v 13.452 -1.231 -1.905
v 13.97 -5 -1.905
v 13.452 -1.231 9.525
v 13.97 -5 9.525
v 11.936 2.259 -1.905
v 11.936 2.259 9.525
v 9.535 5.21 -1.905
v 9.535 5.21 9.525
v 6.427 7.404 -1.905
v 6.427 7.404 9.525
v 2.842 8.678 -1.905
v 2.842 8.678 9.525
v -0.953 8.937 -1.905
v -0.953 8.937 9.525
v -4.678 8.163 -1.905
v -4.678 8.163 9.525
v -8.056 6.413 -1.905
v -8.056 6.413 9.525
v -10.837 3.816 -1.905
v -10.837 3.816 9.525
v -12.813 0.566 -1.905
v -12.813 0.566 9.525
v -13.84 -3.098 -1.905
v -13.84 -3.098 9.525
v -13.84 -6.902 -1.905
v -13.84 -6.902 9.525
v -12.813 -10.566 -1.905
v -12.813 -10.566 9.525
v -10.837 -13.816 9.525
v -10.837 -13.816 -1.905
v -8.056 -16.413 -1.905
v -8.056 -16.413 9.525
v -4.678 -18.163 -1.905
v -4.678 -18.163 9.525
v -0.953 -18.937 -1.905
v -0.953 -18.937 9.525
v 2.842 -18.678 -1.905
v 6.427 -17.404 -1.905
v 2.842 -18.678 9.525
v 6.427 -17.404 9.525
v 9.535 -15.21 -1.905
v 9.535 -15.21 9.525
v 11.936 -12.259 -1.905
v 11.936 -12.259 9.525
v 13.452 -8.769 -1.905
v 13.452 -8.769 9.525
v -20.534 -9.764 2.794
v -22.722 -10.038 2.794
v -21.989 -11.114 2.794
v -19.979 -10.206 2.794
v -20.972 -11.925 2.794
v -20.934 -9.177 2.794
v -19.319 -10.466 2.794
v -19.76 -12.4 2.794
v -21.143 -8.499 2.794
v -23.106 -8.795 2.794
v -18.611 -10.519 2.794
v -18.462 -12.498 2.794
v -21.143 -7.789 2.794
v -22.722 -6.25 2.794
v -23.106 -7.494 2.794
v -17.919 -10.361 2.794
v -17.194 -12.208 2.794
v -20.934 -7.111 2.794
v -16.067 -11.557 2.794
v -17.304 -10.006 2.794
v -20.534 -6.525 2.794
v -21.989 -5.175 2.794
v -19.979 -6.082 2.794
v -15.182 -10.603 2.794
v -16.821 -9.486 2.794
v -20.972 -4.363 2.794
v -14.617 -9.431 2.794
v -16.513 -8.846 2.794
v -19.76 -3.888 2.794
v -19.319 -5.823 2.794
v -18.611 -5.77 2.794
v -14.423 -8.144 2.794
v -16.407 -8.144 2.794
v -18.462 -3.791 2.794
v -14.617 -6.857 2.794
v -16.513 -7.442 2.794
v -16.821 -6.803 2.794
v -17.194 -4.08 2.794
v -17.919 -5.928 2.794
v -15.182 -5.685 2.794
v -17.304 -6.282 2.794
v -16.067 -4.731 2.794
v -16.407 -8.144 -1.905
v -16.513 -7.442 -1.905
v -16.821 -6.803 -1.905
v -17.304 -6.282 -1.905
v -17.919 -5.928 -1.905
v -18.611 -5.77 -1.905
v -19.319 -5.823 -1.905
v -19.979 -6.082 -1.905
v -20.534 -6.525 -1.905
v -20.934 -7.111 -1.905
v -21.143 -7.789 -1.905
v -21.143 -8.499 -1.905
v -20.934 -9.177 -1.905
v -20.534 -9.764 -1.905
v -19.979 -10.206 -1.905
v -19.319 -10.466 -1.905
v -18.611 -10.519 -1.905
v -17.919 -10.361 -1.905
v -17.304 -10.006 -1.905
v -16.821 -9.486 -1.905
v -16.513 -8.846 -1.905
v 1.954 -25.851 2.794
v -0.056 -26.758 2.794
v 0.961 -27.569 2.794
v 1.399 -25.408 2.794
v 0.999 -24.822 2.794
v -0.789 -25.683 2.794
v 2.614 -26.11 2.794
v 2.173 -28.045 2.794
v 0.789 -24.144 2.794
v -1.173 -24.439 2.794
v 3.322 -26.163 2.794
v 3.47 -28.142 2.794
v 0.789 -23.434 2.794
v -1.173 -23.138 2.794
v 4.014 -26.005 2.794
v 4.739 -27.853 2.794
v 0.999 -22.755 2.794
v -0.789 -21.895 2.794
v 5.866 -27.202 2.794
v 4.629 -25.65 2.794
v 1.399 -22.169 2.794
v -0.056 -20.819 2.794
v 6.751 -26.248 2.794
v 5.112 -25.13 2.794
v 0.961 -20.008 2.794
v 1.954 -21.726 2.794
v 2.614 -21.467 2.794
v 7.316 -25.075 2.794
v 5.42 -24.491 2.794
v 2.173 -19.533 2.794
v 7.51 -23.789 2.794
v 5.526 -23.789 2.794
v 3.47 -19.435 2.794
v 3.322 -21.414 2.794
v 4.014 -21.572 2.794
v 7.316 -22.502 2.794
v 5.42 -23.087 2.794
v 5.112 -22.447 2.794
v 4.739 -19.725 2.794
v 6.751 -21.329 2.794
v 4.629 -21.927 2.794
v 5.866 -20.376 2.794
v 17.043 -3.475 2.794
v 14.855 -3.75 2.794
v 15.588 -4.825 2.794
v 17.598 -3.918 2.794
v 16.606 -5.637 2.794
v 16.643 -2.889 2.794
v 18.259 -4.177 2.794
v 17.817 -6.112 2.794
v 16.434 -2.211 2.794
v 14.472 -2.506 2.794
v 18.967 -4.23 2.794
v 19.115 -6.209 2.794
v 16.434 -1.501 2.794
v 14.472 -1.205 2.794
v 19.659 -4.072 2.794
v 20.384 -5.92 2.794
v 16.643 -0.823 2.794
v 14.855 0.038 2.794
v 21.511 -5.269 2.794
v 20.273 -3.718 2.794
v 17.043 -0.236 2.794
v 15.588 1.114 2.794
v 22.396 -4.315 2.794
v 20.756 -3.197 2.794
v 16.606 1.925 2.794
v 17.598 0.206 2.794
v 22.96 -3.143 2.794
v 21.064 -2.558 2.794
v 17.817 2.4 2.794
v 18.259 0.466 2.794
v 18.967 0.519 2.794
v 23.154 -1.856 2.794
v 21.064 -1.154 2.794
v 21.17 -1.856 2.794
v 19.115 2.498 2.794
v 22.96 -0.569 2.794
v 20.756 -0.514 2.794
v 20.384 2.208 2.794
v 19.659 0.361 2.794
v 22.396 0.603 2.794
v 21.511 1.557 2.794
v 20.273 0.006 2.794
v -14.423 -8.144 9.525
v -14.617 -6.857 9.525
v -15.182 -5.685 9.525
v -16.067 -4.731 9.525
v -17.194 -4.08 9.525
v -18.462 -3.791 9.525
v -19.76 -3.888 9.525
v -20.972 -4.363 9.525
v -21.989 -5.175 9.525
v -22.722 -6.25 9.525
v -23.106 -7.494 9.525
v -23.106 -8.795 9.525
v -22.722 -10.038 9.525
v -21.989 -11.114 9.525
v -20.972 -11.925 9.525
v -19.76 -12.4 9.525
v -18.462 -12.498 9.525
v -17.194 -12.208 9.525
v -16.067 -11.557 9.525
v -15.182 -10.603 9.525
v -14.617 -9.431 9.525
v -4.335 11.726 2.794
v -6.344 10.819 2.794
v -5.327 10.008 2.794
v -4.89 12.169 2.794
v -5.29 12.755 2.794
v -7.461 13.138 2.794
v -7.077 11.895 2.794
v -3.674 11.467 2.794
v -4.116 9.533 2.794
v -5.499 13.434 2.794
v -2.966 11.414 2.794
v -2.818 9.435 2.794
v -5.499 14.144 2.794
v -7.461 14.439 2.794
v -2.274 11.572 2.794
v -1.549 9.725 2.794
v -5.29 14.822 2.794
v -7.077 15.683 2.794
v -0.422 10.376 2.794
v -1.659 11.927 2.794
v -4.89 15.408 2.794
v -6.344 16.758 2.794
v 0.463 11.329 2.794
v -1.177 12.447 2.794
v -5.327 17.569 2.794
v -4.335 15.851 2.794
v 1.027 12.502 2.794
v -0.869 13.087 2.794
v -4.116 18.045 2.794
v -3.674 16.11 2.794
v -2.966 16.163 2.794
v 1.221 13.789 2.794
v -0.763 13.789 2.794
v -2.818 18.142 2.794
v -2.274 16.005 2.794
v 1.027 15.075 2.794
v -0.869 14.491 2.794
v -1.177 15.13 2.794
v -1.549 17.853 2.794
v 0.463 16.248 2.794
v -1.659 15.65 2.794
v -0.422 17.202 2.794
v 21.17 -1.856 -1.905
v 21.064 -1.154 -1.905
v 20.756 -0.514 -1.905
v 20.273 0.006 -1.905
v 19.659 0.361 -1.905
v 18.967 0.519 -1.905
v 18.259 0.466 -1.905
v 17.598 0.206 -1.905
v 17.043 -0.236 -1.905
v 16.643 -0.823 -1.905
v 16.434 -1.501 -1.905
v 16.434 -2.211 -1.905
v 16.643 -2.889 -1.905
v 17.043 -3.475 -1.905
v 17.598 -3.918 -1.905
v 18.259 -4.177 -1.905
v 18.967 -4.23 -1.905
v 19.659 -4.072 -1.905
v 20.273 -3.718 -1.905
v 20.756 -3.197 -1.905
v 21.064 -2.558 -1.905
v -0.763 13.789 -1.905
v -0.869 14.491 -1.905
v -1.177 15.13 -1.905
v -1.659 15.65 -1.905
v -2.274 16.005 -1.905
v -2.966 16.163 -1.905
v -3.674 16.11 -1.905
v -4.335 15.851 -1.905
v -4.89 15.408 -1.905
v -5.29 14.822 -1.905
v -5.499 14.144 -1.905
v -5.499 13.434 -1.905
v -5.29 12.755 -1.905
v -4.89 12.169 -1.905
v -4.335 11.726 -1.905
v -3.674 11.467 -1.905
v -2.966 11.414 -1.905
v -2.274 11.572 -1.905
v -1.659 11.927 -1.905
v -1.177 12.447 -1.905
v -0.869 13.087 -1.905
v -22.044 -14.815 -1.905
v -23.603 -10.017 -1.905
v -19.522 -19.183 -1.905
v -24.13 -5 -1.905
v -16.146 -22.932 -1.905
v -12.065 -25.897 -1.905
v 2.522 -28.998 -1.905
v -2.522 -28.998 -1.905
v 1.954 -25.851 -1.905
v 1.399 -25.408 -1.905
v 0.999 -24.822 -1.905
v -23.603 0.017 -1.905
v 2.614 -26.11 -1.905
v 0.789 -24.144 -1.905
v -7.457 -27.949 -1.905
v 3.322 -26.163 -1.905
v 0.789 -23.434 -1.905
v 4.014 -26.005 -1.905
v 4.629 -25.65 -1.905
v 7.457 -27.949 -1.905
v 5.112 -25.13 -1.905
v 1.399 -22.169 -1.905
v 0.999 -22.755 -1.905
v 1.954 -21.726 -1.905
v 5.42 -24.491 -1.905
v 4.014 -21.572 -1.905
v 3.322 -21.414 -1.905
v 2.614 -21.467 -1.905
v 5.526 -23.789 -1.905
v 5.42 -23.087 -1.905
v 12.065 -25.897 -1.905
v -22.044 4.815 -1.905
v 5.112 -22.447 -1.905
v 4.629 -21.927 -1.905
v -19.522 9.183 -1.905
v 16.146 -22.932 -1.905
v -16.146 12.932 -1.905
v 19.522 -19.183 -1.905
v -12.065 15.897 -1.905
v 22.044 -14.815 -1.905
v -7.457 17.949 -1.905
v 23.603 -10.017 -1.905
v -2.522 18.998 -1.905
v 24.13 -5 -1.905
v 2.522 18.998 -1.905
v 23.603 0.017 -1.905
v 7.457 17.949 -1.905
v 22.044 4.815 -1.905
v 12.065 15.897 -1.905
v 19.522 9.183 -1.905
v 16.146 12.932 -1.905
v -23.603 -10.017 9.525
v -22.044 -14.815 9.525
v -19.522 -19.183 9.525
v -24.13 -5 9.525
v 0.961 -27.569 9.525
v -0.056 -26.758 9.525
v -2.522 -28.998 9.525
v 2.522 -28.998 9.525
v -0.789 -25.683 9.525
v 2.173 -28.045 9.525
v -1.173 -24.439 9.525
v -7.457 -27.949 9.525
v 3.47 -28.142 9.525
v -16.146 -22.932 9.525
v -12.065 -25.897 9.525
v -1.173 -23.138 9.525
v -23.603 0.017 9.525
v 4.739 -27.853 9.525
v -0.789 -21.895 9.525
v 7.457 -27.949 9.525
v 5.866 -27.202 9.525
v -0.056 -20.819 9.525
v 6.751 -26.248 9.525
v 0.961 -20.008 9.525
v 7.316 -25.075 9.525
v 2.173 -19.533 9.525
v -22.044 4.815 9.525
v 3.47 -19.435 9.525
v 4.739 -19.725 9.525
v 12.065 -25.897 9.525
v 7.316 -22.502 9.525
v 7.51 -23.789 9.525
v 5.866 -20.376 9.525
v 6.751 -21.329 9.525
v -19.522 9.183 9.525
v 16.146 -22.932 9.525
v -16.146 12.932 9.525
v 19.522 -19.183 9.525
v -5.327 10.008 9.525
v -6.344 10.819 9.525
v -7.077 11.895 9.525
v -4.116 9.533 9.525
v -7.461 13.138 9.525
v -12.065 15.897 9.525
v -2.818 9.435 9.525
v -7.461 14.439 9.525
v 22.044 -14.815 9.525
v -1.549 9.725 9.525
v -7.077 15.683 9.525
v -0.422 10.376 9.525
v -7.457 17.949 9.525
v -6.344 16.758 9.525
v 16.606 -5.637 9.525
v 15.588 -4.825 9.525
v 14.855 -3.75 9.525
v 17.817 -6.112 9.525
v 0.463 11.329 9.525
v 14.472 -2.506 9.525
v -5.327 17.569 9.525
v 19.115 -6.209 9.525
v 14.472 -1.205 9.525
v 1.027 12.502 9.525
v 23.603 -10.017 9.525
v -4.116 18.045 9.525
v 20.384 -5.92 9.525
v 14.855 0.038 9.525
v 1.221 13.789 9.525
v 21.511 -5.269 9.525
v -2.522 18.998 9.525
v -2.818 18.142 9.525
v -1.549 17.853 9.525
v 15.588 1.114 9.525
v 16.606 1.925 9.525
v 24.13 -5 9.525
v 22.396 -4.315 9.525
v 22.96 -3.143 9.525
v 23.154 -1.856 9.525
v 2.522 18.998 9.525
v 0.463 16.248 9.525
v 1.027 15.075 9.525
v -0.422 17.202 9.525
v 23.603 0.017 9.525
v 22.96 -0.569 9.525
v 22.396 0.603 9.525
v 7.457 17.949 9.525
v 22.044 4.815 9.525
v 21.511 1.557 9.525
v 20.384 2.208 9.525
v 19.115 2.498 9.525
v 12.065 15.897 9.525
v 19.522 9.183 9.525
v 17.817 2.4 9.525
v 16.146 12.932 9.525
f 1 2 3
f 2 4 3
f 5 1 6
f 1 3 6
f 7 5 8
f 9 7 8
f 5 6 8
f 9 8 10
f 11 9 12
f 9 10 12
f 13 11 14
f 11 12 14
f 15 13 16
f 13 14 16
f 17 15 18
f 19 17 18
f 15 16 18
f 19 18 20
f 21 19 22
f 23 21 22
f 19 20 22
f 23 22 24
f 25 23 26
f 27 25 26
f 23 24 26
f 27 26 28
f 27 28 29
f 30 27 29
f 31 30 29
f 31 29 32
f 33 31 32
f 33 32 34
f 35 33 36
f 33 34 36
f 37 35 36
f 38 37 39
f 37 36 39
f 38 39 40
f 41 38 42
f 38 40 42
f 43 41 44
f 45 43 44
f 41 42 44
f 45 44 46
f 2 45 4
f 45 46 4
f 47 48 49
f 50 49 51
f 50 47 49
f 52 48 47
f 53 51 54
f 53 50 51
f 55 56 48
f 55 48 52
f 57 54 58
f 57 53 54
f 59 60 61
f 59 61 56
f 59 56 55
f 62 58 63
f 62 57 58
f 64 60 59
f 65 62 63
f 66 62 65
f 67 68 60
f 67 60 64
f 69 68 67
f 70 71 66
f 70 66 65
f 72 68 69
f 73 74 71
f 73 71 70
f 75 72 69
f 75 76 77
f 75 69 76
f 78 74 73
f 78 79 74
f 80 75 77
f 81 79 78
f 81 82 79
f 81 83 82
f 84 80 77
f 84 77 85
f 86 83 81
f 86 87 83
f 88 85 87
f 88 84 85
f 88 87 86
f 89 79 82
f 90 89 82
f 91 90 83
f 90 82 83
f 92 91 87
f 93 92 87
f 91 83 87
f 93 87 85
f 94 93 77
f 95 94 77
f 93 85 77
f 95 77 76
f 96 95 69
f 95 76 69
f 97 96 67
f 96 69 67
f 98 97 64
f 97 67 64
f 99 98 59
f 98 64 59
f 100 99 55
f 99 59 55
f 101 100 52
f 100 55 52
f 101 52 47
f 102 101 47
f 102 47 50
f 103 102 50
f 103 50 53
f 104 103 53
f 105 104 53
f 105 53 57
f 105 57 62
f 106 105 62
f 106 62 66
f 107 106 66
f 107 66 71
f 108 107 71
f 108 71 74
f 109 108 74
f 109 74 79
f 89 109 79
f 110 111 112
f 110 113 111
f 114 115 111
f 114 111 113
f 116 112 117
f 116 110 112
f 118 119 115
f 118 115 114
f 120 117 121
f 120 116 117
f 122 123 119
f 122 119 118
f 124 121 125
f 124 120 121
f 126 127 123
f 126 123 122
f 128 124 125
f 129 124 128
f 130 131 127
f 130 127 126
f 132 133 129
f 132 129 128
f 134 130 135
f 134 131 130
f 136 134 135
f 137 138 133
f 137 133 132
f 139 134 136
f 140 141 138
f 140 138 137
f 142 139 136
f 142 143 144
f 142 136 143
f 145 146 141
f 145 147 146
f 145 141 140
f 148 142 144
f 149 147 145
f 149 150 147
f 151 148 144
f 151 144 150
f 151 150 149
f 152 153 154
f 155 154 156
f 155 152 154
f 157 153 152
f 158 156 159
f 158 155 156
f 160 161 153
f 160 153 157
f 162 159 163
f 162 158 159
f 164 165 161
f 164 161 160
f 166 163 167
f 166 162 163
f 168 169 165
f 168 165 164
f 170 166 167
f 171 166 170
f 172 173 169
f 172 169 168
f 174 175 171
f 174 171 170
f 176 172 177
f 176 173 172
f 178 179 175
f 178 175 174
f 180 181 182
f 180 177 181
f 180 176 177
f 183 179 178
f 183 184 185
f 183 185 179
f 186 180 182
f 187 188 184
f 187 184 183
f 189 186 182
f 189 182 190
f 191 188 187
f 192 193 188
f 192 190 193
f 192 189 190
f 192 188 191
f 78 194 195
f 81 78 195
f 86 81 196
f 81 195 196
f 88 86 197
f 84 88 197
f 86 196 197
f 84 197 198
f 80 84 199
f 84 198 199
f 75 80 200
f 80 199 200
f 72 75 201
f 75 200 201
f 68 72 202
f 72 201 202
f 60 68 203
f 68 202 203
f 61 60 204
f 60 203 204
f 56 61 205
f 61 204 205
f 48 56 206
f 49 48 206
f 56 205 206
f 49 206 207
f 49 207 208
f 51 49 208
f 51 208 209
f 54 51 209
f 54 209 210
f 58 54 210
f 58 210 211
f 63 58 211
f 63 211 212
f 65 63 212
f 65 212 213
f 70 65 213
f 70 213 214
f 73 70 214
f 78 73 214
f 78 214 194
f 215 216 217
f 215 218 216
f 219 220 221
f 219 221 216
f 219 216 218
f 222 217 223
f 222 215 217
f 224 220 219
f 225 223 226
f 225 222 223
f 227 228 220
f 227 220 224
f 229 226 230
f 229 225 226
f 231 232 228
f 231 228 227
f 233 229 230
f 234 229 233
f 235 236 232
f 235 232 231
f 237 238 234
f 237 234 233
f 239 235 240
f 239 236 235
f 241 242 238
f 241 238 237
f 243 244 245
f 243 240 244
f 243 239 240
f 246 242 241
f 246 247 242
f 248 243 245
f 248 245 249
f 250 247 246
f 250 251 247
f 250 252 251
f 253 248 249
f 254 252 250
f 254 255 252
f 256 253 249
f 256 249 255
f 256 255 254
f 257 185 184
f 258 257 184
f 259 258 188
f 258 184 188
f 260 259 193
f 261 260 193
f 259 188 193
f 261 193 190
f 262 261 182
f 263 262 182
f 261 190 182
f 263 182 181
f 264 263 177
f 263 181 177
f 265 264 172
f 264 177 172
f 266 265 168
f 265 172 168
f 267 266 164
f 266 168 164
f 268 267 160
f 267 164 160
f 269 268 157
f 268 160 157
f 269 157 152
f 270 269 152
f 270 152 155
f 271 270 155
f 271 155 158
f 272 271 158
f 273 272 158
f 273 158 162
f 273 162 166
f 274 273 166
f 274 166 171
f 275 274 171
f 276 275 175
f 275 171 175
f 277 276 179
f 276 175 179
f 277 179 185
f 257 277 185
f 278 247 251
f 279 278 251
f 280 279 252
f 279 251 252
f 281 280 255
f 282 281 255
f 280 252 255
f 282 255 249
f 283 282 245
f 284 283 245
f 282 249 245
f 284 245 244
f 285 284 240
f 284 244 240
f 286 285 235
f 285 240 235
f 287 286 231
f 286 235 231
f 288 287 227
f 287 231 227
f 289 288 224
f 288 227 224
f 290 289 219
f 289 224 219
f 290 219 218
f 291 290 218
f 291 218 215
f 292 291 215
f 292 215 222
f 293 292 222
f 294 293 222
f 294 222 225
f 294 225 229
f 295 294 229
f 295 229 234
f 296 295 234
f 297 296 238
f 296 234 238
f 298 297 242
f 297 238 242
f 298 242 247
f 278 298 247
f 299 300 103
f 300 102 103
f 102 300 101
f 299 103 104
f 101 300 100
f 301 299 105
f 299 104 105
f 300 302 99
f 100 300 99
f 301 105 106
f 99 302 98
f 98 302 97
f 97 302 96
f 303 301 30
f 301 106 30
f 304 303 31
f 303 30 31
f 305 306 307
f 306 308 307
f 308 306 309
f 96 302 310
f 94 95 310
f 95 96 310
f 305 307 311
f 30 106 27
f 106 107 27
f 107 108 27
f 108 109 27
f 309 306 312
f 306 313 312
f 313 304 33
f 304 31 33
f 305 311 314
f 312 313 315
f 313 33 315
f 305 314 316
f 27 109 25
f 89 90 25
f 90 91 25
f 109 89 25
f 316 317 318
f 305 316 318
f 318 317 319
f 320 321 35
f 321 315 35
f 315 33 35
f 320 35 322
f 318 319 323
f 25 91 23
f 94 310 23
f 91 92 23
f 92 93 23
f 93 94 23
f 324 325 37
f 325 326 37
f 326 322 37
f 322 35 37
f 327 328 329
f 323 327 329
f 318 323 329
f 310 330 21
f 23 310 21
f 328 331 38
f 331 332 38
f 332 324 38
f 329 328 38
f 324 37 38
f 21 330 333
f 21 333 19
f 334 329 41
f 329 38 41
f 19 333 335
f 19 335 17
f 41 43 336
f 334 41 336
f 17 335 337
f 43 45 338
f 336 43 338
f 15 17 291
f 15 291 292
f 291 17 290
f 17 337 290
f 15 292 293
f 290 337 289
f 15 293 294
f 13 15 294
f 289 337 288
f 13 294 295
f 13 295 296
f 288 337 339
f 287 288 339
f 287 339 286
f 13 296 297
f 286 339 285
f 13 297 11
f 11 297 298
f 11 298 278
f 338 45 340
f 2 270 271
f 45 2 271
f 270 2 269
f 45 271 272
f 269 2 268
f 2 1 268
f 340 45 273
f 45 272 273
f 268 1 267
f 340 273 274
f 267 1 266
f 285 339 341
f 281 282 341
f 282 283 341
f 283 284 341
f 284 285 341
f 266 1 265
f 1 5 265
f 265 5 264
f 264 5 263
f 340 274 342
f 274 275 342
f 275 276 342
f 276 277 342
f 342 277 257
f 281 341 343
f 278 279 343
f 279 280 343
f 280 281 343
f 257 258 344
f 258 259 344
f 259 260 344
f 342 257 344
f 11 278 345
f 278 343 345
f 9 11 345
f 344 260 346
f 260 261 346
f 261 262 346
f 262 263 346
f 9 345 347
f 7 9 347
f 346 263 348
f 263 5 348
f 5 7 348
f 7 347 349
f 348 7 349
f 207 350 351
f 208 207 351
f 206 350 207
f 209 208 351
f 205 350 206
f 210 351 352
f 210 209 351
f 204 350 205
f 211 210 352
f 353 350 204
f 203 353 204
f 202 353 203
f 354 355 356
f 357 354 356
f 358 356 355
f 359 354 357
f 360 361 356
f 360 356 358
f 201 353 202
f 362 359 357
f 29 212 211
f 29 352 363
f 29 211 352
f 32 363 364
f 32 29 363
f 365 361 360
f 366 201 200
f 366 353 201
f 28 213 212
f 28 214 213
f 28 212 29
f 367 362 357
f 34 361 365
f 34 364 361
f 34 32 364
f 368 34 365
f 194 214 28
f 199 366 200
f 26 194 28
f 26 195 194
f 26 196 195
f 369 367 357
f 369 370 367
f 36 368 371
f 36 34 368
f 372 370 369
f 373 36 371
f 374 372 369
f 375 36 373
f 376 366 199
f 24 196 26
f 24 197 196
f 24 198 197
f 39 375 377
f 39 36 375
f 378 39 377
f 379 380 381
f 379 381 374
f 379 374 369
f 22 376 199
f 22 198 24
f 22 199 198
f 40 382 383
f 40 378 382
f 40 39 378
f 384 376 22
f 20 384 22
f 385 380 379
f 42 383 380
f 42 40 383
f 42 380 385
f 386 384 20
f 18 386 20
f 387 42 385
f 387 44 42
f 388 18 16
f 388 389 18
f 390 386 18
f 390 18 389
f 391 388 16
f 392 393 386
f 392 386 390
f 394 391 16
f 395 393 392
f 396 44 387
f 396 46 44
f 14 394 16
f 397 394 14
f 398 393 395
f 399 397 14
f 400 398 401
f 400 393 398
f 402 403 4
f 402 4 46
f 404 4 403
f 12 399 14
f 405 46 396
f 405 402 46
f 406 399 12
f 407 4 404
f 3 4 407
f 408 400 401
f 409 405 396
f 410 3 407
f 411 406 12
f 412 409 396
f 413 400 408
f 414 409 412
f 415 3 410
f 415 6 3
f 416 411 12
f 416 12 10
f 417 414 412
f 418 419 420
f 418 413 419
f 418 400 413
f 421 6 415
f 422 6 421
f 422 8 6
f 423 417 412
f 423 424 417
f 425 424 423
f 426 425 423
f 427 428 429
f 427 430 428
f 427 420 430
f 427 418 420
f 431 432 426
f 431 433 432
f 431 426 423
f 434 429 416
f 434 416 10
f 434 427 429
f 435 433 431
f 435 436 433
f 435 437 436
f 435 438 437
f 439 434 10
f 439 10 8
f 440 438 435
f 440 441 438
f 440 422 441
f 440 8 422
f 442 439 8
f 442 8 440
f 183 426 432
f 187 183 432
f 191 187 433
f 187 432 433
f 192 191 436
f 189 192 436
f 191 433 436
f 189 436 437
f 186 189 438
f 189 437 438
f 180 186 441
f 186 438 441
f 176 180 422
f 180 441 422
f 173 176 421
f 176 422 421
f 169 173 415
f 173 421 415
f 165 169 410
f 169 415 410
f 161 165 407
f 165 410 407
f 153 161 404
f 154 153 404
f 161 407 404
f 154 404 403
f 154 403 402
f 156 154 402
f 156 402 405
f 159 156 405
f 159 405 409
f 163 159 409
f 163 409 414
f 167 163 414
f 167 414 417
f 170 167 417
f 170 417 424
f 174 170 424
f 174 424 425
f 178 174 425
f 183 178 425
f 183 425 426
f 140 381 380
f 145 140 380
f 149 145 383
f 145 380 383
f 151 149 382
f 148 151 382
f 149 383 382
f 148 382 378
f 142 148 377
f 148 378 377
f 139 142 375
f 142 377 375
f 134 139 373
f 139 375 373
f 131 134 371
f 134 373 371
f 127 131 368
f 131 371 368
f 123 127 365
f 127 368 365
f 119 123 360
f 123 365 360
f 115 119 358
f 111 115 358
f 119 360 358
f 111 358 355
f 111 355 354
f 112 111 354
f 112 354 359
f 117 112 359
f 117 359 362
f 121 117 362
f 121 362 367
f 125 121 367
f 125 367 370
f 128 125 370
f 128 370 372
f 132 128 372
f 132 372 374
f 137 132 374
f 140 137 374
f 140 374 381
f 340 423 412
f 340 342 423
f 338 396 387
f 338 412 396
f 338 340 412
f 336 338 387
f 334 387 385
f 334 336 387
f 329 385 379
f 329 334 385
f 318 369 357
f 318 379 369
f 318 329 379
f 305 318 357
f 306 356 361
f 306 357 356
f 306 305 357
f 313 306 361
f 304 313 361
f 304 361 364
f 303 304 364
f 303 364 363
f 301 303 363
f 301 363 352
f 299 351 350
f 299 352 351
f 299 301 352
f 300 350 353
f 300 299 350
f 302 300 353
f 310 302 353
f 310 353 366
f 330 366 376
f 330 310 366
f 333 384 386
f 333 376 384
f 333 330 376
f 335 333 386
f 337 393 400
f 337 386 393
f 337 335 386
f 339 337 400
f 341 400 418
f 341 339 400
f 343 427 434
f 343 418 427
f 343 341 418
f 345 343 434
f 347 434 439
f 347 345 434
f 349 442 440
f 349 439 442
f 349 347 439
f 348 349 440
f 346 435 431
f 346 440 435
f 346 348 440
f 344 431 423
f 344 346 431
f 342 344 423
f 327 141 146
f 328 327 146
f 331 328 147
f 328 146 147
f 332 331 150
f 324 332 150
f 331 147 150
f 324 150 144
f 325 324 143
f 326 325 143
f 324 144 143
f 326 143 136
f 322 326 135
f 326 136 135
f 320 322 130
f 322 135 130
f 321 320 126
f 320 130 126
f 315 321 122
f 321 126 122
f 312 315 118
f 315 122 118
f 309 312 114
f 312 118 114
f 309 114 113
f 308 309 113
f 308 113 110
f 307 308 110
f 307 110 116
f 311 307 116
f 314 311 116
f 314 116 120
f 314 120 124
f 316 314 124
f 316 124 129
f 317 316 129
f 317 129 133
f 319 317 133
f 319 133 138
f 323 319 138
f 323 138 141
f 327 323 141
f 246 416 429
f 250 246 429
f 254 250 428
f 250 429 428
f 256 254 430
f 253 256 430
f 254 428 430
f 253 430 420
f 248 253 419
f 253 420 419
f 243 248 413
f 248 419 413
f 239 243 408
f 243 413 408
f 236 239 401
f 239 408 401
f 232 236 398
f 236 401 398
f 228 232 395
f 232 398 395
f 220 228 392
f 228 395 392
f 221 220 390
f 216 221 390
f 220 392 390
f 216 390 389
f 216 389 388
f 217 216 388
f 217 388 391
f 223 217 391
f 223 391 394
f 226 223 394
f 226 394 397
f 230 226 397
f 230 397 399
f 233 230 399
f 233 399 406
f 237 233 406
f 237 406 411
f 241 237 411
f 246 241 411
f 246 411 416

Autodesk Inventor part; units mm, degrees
ref_plane "YZ Plane" through (0, 0, 0) normal (1, 0, 0) x (0, 1, 0)
ref_plane "XZ Plane" through (0, 0, 0) normal (0, 1, 0) x (-1, 0, 0)
sketch "Sketch1" plane through (0, 0, 0) normal (0, 0, 1) x (1, 0, 0)
  circle A0 centre (0, -5) radius 24.13
  arc A1 (8.8745, 26.3158) -> (5.7516, 27.0368) centre (0, -5) ccw projected
  arc A2 (4.2323, 24.7681) -> (5.7516, 27.0368) centre (-4.1491, 32.0239) ccw projected
  arc A3 (-2.4071, 24.9709) -> (4.2323, 24.7681) centre (0.994, 27.5338) ccw projected
  arc A4 (-3.7851, 27.3282) -> (-2.4071, 24.9709) centre (6.4016, 31.7016) ccw projected
  arc A5 (-3.7851, 27.3282) -> (-6.9462, 26.7992) centre (0, -5) ccw projected
  arc A6 (-7.4816, 24.1217) -> (-6.9462, 26.7992) centre (-18.0017, 27.6179) ccw projected
  arc A7 (-13.6933, 21.7684) -> (-7.4816, 24.1217) centre (-11.5318, 25.4377) ccw projected
  arc A8 (-15.8684, 23.4189) -> (-13.6933, 21.7684) centre (-8.1308, 31.3576) ccw projected
  arc A9 (-15.8684, 23.4189) -> (-18.5865, 21.7204) centre (0, -5) ccw projected
  arc A10 (-18.0565, 19.0419) -> (-18.5865, 21.7204) centre (-29.1137, 18.246) ccw projected
  arc A11 (-22.8947, 14.4906) -> (-18.0565, 19.0419) centre (-22.302, 18.7078) ccw projected
  arc A12 (-25.5359, 15.183) -> (-22.8947, 14.4906) centre (-21.4253, 25.4785) ccw projected
  arc A13 (-25.5359, 15.183) -> (-27.3971, 12.5737) centre (0, -5) ccw projected
  arc A14 (-25.8825, 10.3019) -> (-27.3971, 12.5737) centre (-35.7934, 5.3352) ccw projected
  arc A15 (-28.6107, 4.2455) -> (-25.8825, 10.3019) centre (-29.677, 8.3685) ccw projected
  arc A16 (-31.3158, 3.8745) -> (-28.6107, 4.2455) centre (-31.4581, 14.9594) ccw projected
  arc A17 (-31.3158, 3.8745) -> (-32.0368, 0.7516) centre (0, -5) ccw projected
  arc A18 (-29.7681, -0.7677) -> (-32.0368, 0.7516) centre (-37.0239, -9.1491) ccw projected
  arc A19 (-29.9709, -7.4071) -> (-29.7681, -0.7677) centre (-32.5338, -4.006) ccw projected
  arc A20 (-32.3282, -8.7851) -> (-29.9709, -7.4071) centre (-36.7016, 1.4016) ccw projected
  arc A21 (-32.3282, -8.7851) -> (-31.7992, -11.9462) centre (0, -5) ccw projected
  arc A22 (-29.1217, -12.4816) -> (-31.7992, -11.9462) centre (-32.6179, -23.0017) ccw projected
  arc A23 (-26.7684, -18.6933) -> (-29.1217, -12.4816) centre (-30.4377, -16.5318) ccw projected
  arc A24 (-28.4189, -20.8684) -> (-26.7684, -18.6933) centre (-36.3576, -13.1308) ccw projected
  arc A25 (-28.4189, -20.8684) -> (-26.7204, -23.5865) centre (0, -5) ccw projected
  arc A26 (-24.0419, -23.0565) -> (-26.7204, -23.5865) centre (-23.246, -34.1137) ccw projected
  arc A27 (-19.4906, -27.8947) -> (-24.0419, -23.0565) centre (-23.7078, -27.302) ccw projected
  arc A28 (-20.183, -30.5359) -> (-19.4906, -27.8947) centre (-30.4785, -26.4253) ccw projected
  arc A29 (-20.183, -30.5359) -> (-17.5737, -32.3971) centre (0, -5) ccw projected
  arc A30 (-15.3019, -30.8825) -> (-17.5737, -32.3971) centre (-10.3352, -40.7934) ccw projected
  arc A31 (-9.2455, -33.6107) -> (-15.3019, -30.8825) centre (-13.3685, -34.677) ccw projected
  arc A32 (-8.8745, -36.3158) -> (-9.2455, -33.6107) centre (-19.9594, -36.4581) ccw projected
  arc A33 (-8.8745, -36.3158) -> (-5.7516, -37.0368) centre (0, -5) ccw projected
  arc A34 (-4.2323, -34.7681) -> (-5.7516, -37.0368) centre (4.1491, -42.0239) ccw projected
  arc A35 (2.4071, -34.9709) -> (-4.2323, -34.7681) centre (-0.994, -37.5338) ccw projected
  arc A36 (3.7851, -37.3282) -> (2.4071, -34.9709) centre (-6.4016, -41.7016) ccw projected
  arc A37 (3.7851, -37.3282) -> (6.9462, -36.7992) centre (0, -5) ccw projected
  arc A38 (7.4816, -34.1217) -> (6.9462, -36.7992) centre (18.0017, -37.6179) ccw projected
  arc A39 (13.6933, -31.7684) -> (7.4816, -34.1217) centre (11.5318, -35.4377) ccw projected
  arc A40 (15.8684, -33.4189) -> (13.6933, -31.7684) centre (8.1308, -41.3576) ccw projected
  arc A41 (15.8684, -33.4189) -> (18.5865, -31.7204) centre (0, -5) ccw projected
  arc A42 (18.0565, -29.0419) -> (18.5865, -31.7204) centre (29.1137, -28.246) ccw projected
  arc A43 (22.8947, -24.4906) -> (18.0565, -29.0419) centre (22.302, -28.7078) ccw projected
  arc A44 (25.5359, -25.183) -> (22.8947, -24.4906) centre (21.4253, -35.4785) ccw projected
  arc A45 (25.5359, -25.183) -> (27.3971, -22.5737) centre (0, -5) ccw projected
  arc A46 (25.8825, -20.3019) -> (27.3971, -22.5737) centre (35.7934, -15.3352) ccw projected
  arc A47 (28.6107, -14.2455) -> (25.8825, -20.3019) centre (29.677, -18.3685) ccw projected
  arc A48 (31.3158, -13.8745) -> (28.6107, -14.2455) centre (31.4581, -24.9594) ccw projected
  arc A49 (31.3158, -13.8745) -> (32.0368, -10.7516) centre (0, -5) ccw projected
  arc A50 (29.7681, -9.2323) -> (32.0368, -10.7516) centre (37.0239, -0.8509) ccw projected
  arc A51 (29.9709, -2.5929) -> (29.7681, -9.2323) centre (32.5338, -5.994) ccw projected
  arc A52 (32.3282, -1.2149) -> (29.9709, -2.5929) centre (36.7016, -11.4016) ccw projected
  arc A53 (32.3282, -1.2149) -> (31.7992, 1.9462) centre (0, -5) ccw projected
  arc A54 (29.1217, 2.4816) -> (31.7992, 1.9462) centre (32.6179, 13.0017) ccw projected
  arc A55 (26.7684, 8.6933) -> (29.1217, 2.4816) centre (30.4377, 6.5318) ccw projected
  arc A56 (28.4189, 10.8684) -> (26.7684, 8.6933) centre (36.3576, 3.1308) ccw projected
  arc A57 (28.4189, 10.8684) -> (26.7204, 13.5865) centre (0, -5) ccw projected
  arc A58 (24.0419, 13.0565) -> (26.7204, 13.5865) centre (23.246, 24.1137) ccw projected
  arc A59 (19.4906, 17.8947) -> (24.0419, 13.0565) centre (23.7078, 17.302) ccw projected
  arc A60 (20.183, 20.5359) -> (19.4906, 17.8947) centre (30.4785, 16.4253) ccw projected
  arc A61 (20.183, 20.5359) -> (17.5737, 22.3971) centre (0, -5) ccw projected
  arc A62 (15.3019, 20.8825) -> (17.5737, 22.3971) centre (10.3352, 30.7934) ccw projected
  arc A63 (9.2455, 23.6107) -> (15.3019, 20.8825) centre (13.3685, 24.677) ccw projected
  arc A64 (8.8745, 26.3158) -> (9.2455, 23.6107) centre (19.9594, 26.4581) ccw projected
  circle A65 centre (0, -5) radius 13.97 projected
  circle A66 centre (-3.1442, 13.7887) radius 2.3813 projected
  circle A67 centre (18.7887, -1.8558) radius 2.3813 projected
  circle A68 centre (-18.7887, -8.1442) radius 2.3813 projected
  circle A69 centre (3.1442, -23.7887) radius 2.3813 projected
  point P0 (0, 0)
  dimension "d0" = 48.26
extrude "Extrusion1" add sketch "Sketch1" along normal blind 9.525 contours A0 | A65 | A66 | A67 | A68 | A69
sketch "Sketch2" plane through (0, -5, 9.525) normal (0, 0, 1) x (1, 0, 0)
  circle A0 centre (0, 0) radius 24.13 projected
  circle A1 centre (0, 19.05) radius 4.7625
  circle A2 centre (-19.05, 0) radius 1.27 projected
  circle A3 centre (-19.05, 0) radius 4.7625
  circle A4 centre (19.05, 0) radius 4.7625
  circle A5 centre (0, -19.05) radius 4.7625
  point P0 (0, 5)
  dimension "d3" = 9.525
  dimension "d4" = 9.525
  dimension "d5" = 9.525
  dimension "d6" = 9.525
ref_plane "Work Plane1" through (-23.0187, -8.9687, 4.5858) normal (0, 0, -1) x (0, 1, 0)
extrude "Extrusion2" [suppressed]
sketch "Sketch3" plane through (0, -5, 9.525) normal (0, 0, 1) x (1, 0, 0)
  circle A0 centre (0, 0) radius 13.97
  point P0 (0, 5)
  dimension "d9" = 27.94
extrude "Extrusion3" cut sketch "Sketch3" against normal blind 39.6875
sketch "Sketch4" plane through (0, -5, 9.525) normal (0, 0, 1) x (1, 0, 0)
  circle A0 centre (0, 0) radius 13.97 projected
  circle A1 centre (0, 0) radius 24.13 projected
  point P0 (0, 5)
extrude "Extrusion4" add sketch "Sketch4" against normal blind 11.43
sketch "Sketch5" plane through (0, -5, 9.525) normal (0, 0, 1) x (1, 0, 0)
  circle A0 centre (-3.1442, 18.7887) radius 2.3813 projected
  circle A1 centre (18.7887, 3.1442) radius 2.3813 projected
  circle A2 centre (-18.7887, -3.1442) radius 2.3813 projected
  circle A3 centre (3.1442, -18.7887) radius 2.3813 projected
  circle A4 centre (0, 0) radius 13.97 projected
  arc A5 (8.8745, 31.3158) -> (5.7516, 32.0368) centre (0, 0) ccw projected
  arc A6 (4.2323, 29.7681) -> (5.7516, 32.0368) centre (-4.1491, 37.0239) ccw projected
  arc A7 (-2.4071, 29.9709) -> (4.2323, 29.7681) centre (0.994, 32.5338) ccw projected
  arc A8 (-3.7851, 32.3282) -> (-2.4071, 29.9709) centre (6.4016, 36.7016) ccw projected
  arc A9 (-3.7851, 32.3282) -> (-6.9462, 31.7992) centre (0, 0) ccw projected
  arc A10 (-7.4816, 29.1217) -> (-6.9462, 31.7992) centre (-18.0017, 32.6179) ccw projected
  arc A11 (-13.6933, 26.7684) -> (-7.4816, 29.1217) centre (-11.5318, 30.4377) ccw projected
  arc A12 (-15.8684, 28.4189) -> (-13.6933, 26.7684) centre (-8.1308, 36.3576) ccw projected
  arc A13 (-15.8684, 28.4189) -> (-18.5865, 26.7204) centre (0, 0) ccw projected
  arc A14 (-18.0565, 24.0419) -> (-18.5865, 26.7204) centre (-29.1137, 23.246) ccw projected
  arc A15 (-22.8947, 19.4906) -> (-18.0565, 24.0419) centre (-22.302, 23.7078) ccw projected
  arc A16 (-25.5359, 20.183) -> (-22.8947, 19.4906) centre (-21.4253, 30.4785) ccw projected
  arc A17 (-25.5359, 20.183) -> (-27.3971, 17.5737) centre (0, 0) ccw projected
  arc A18 (-25.8825, 15.3019) -> (-27.3971, 17.5737) centre (-35.7934, 10.3352) ccw projected
  arc A19 (-28.6107, 9.2455) -> (-25.8825, 15.3019) centre (-29.677, 13.3685) ccw projected
  arc A20 (-31.3158, 8.8745) -> (-28.6107, 9.2455) centre (-31.4581, 19.9594) ccw projected
  arc A21 (-31.3158, 8.8745) -> (-32.0368, 5.7516) centre (0, 0) ccw projected
  arc A22 (-29.7681, 4.2323) -> (-32.0368, 5.7516) centre (-37.0239, -4.1491) ccw projected
  arc A23 (-29.9709, -2.4071) -> (-29.7681, 4.2323) centre (-32.5338, 0.994) ccw projected
  arc A24 (-32.3282, -3.7851) -> (-29.9709, -2.4071) centre (-36.7016, 6.4016) ccw projected
  arc A25 (-32.3282, -3.7851) -> (-31.7992, -6.9462) centre (0, 0) ccw projected
  arc A26 (-29.1217, -7.4816) -> (-31.7992, -6.9462) centre (-32.6179, -18.0017) ccw projected
  arc A27 (-26.7684, -13.6933) -> (-29.1217, -7.4816) centre (-30.4377, -11.5318) ccw projected
  arc A28 (-28.4189, -15.8684) -> (-26.7684, -13.6933) centre (-36.3576, -8.1308) ccw projected
  arc A29 (-28.4189, -15.8684) -> (-26.7204, -18.5865) centre (0, 0) ccw projected
  arc A30 (-24.0419, -18.0565) -> (-26.7204, -18.5865) centre (-23.246, -29.1137) ccw projected
  arc A31 (-19.4906, -22.8947) -> (-24.0419, -18.0565) centre (-23.7078, -22.302) ccw projected
  arc A32 (-20.183, -25.5359) -> (-19.4906, -22.8947) centre (-30.4785, -21.4253) ccw projected
  arc A33 (-20.183, -25.5359) -> (-17.5737, -27.3971) centre (0, 0) ccw projected
  arc A34 (-15.3019, -25.8825) -> (-17.5737, -27.3971) centre (-10.3352, -35.7934) ccw projected
  arc A35 (-9.2455, -28.6107) -> (-15.3019, -25.8825) centre (-13.3685, -29.677) ccw projected
  arc A36 (-8.8745, -31.3158) -> (-9.2455, -28.6107) centre (-19.9594, -31.4581) ccw projected
  arc A37 (-8.8745, -31.3158) -> (-5.7516, -32.0368) centre (0, 0) ccw projected
  arc A38 (-4.2323, -29.7681) -> (-5.7516, -32.0368) centre (4.1491, -37.0239) ccw projected
  arc A39 (2.4071, -29.9709) -> (-4.2323, -29.7681) centre (-0.994, -32.5338) ccw projected
  arc A40 (3.7851, -32.3282) -> (2.4071, -29.9709) centre (-6.4016, -36.7016) ccw projected
  arc A41 (3.7851, -32.3282) -> (6.9462, -31.7992) centre (0, 0) ccw projected
  arc A42 (7.4816, -29.1217) -> (6.9462, -31.7992) centre (18.0017, -32.6179) ccw projected
  arc A43 (13.6933, -26.7684) -> (7.4816, -29.1217) centre (11.5318, -30.4377) ccw projected
  arc A44 (15.8684, -28.4189) -> (13.6933, -26.7684) centre (8.1308, -36.3576) ccw projected
  arc A45 (15.8684, -28.4189) -> (18.5865, -26.7204) centre (0, 0) ccw projected
  arc A46 (18.0565, -24.0419) -> (18.5865, -26.7204) centre (29.1137, -23.246) ccw projected
  arc A47 (22.8947, -19.4906) -> (18.0565, -24.0419) centre (22.302, -23.7078) ccw projected
  arc A48 (25.5359, -20.183) -> (22.8947, -19.4906) centre (21.4253, -30.4785) ccw projected
  arc A49 (25.5359, -20.183) -> (27.3971, -17.5737) centre (0, 0) ccw projected
  arc A50 (25.8825, -15.3019) -> (27.3971, -17.5737) centre (35.7934, -10.3352) ccw projected
  arc A51 (28.6107, -9.2455) -> (25.8825, -15.3019) centre (29.677, -13.3685) ccw projected
  arc A52 (31.3158, -8.8745) -> (28.6107, -9.2455) centre (31.4581, -19.9594) ccw projected
  arc A53 (31.3158, -8.8745) -> (32.0368, -5.7516) centre (0, 0) ccw projected
  arc A54 (29.7681, -4.2323) -> (32.0368, -5.7516) centre (37.0239, 4.1491) ccw projected
  arc A55 (29.9709, 2.4071) -> (29.7681, -4.2323) centre (32.5338, -0.994) ccw projected
  arc A56 (32.3282, 3.7851) -> (29.9709, 2.4071) centre (36.7016, -6.4016) ccw projected
  arc A57 (32.3282, 3.7851) -> (31.7992, 6.9462) centre (0, 0) ccw projected
  arc A58 (29.1217, 7.4816) -> (31.7992, 6.9462) centre (32.6179, 18.0017) ccw projected
  arc A59 (26.7684, 13.6933) -> (29.1217, 7.4816) centre (30.4377, 11.5318) ccw projected
  arc A60 (28.4189, 15.8684) -> (26.7684, 13.6933) centre (36.3576, 8.1308) ccw projected
  arc A61 (28.4189, 15.8684) -> (26.7204, 18.5865) centre (0, 0) ccw projected
  arc A62 (24.0419, 18.0565) -> (26.7204, 18.5865) centre (23.246, 29.1137) ccw projected
  arc A63 (19.4906, 22.8947) -> (24.0419, 18.0565) centre (23.7078, 22.302) ccw projected
  arc A64 (20.183, 25.5359) -> (19.4906, 22.8947) centre (30.4785, 21.4253) ccw projected
  arc A65 (20.183, 25.5359) -> (17.5737, 27.3971) centre (0, 0) ccw projected
  arc A66 (15.3019, 25.8825) -> (17.5737, 27.3971) centre (10.3352, 35.7934) ccw projected
  arc A67 (9.2455, 28.6107) -> (15.3019, 25.8825) centre (13.3685, 29.677) ccw projected
  arc A68 (8.8745, 31.3158) -> (9.2455, 28.6107) centre (19.9594, 31.4581) ccw projected
  circle A69 centre (3.1442, -18.7887) radius 4.3656
  circle A70 centre (-18.7887, -3.1442) radius 4.3656
  circle A71 centre (18.7887, 3.1442) radius 4.3656
  circle A72 centre (-3.1442, 18.7887) radius 4.3656
  point P0 (0, 5)
  dimension "d14" = 8.7312
  dimension "d17" = 8.7312
  dimension "d18" = 8.7312
  dimension "d19" = 8.7312
extrude "Extrusion5" cut sketch "Sketch5" against normal blind 6.731 contours A0 | A1 | A2 | A3 | A69 | A70 | A71 | A72
sketch "Sketch6" plane through (0, -5, 9.525) normal (0, 0, 1) x (1, 0, 0)
  circle A0 centre (0, 0) radius 24.13 projected
  circle A1 centre (-3.1442, 18.7887) radius 2.3813 projected
  circle A2 centre (18.7887, 3.1442) radius 2.3813 projected
  circle A3 centre (-18.7887, -3.1442) radius 2.3813 projected
  circle A4 centre (3.1442, -18.7887) radius 2.3813 projected
  circle A5 centre (0, 0) radius 13.97 projected
  arc A6 (8.8745, 31.3158) -> (5.7516, 32.0368) centre (0, 0) ccw projected
  arc A7 (4.2323, 29.7681) -> (5.7516, 32.0368) centre (-4.1491, 37.0239) ccw projected
  arc A8 (-2.4071, 29.9709) -> (4.2323, 29.7681) centre (0.994, 32.5338) ccw projected
  arc A9 (-3.7851, 32.3282) -> (-2.4071, 29.9709) centre (6.4016, 36.7016) ccw projected
  arc A10 (-3.7851, 32.3282) -> (-6.9462, 31.7992) centre (0, 0) ccw projected
  arc A11 (-7.4816, 29.1217) -> (-6.9462, 31.7992) centre (-18.0017, 32.6179) ccw projected
  arc A12 (-13.6933, 26.7684) -> (-7.4816, 29.1217) centre (-11.5318, 30.4377) ccw projected
  arc A13 (-15.8684, 28.4189) -> (-13.6933, 26.7684) centre (-8.1308, 36.3576) ccw projected
  arc A14 (-15.8684, 28.4189) -> (-18.5865, 26.7204) centre (0, 0) ccw projected
  arc A15 (-18.0565, 24.0419) -> (-18.5865, 26.7204) centre (-29.1137, 23.246) ccw projected
  arc A16 (-22.8947, 19.4906) -> (-18.0565, 24.0419) centre (-22.302, 23.7078) ccw projected
  arc A17 (-25.5359, 20.183) -> (-22.8947, 19.4906) centre (-21.4253, 30.4785) ccw projected
  arc A18 (-25.5359, 20.183) -> (-27.3971, 17.5737) centre (0, 0) ccw projected
  arc A19 (-25.8825, 15.3019) -> (-27.3971, 17.5737) centre (-35.7934, 10.3352) ccw projected
  arc A20 (-28.6107, 9.2455) -> (-25.8825, 15.3019) centre (-29.677, 13.3685) ccw projected
  arc A21 (-31.3158, 8.8745) -> (-28.6107, 9.2455) centre (-31.4581, 19.9594) ccw projected
  arc A22 (-31.3158, 8.8745) -> (-32.0368, 5.7516) centre (0, 0) ccw projected
  arc A23 (-29.7681, 4.2323) -> (-32.0368, 5.7516) centre (-37.0239, -4.1491) ccw projected
  arc A24 (-29.9709, -2.4071) -> (-29.7681, 4.2323) centre (-32.5338, 0.994) ccw projected
  arc A25 (-32.3282, -3.7851) -> (-29.9709, -2.4071) centre (-36.7016, 6.4016) ccw projected
  arc A26 (-32.3282, -3.7851) -> (-31.7992, -6.9462) centre (0, 0) ccw projected
  arc A27 (-29.1217, -7.4816) -> (-31.7992, -6.9462) centre (-32.6179, -18.0017) ccw projected
  arc A28 (-26.7684, -13.6933) -> (-29.1217, -7.4816) centre (-30.4377, -11.5318) ccw projected
  arc A29 (-28.4189, -15.8684) -> (-26.7684, -13.6933) centre (-36.3576, -8.1308) ccw projected
  arc A30 (-28.4189, -15.8684) -> (-26.7204, -18.5865) centre (0, 0) ccw projected
  arc A31 (-24.0419, -18.0565) -> (-26.7204, -18.5865) centre (-23.246, -29.1137) ccw projected
  arc A32 (-19.4906, -22.8947) -> (-24.0419, -18.0565) centre (-23.7078, -22.302) ccw projected
  arc A33 (-20.183, -25.5359) -> (-19.4906, -22.8947) centre (-30.4785, -21.4253) ccw projected
  arc A34 (-20.183, -25.5359) -> (-17.5737, -27.3971) centre (0, 0) ccw projected
  arc A35 (-15.3019, -25.8825) -> (-17.5737, -27.3971) centre (-10.3352, -35.7934) ccw projected
  arc A36 (-9.2455, -28.6107) -> (-15.3019, -25.8825) centre (-13.3685, -29.677) ccw projected
  arc A37 (-8.8745, -31.3158) -> (-9.2455, -28.6107) centre (-19.9594, -31.4581) ccw projected
  arc A38 (-8.8745, -31.3158) -> (-5.7516, -32.0368) centre (0, 0) ccw projected
  arc A39 (-4.2323, -29.7681) -> (-5.7516, -32.0368) centre (4.1491, -37.0239) ccw projected
  arc A40 (2.4071, -29.9709) -> (-4.2323, -29.7681) centre (-0.994, -32.5338) ccw projected
  arc A41 (3.7851, -32.3282) -> (2.4071, -29.9709) centre (-6.4016, -36.7016) ccw projected
  arc A42 (3.7851, -32.3282) -> (6.9462, -31.7992) centre (0, 0) ccw projected
  arc A43 (7.4816, -29.1217) -> (6.9462, -31.7992) centre (18.0017, -32.6179) ccw projected
  arc A44 (13.6933, -26.7684) -> (7.4816, -29.1217) centre (11.5318, -30.4377) ccw projected
  arc A45 (15.8684, -28.4189) -> (13.6933, -26.7684) centre (8.1308, -36.3576) ccw projected
  arc A46 (15.8684, -28.4189) -> (18.5865, -26.7204) centre (0, 0) ccw projected
  arc A47 (18.0565, -24.0419) -> (18.5865, -26.7204) centre (29.1137, -23.246) ccw projected
  arc A48 (22.8947, -19.4906) -> (18.0565, -24.0419) centre (22.302, -23.7078) ccw projected
  arc A49 (25.5359, -20.183) -> (22.8947, -19.4906) centre (21.4253, -30.4785) ccw projected
  arc A50 (25.5359, -20.183) -> (27.3971, -17.5737) centre (0, 0) ccw projected
  arc A51 (25.8825, -15.3019) -> (27.3971, -17.5737) centre (35.7934, -10.3352) ccw projected
  arc A52 (28.6107, -9.2455) -> (25.8825, -15.3019) centre (29.677, -13.3685) ccw projected
  arc A53 (31.3158, -8.8745) -> (28.6107, -9.2455) centre (31.4581, -19.9594) ccw projected
  arc A54 (31.3158, -8.8745) -> (32.0368, -5.7516) centre (0, 0) ccw projected
  arc A55 (29.7681, -4.2323) -> (32.0368, -5.7516) centre (37.0239, 4.1491) ccw projected
  arc A56 (29.9709, 2.4071) -> (29.7681, -4.2323) centre (32.5338, -0.994) ccw projected
  arc A57 (32.3282, 3.7851) -> (29.9709, 2.4071) centre (36.7016, -6.4016) ccw projected
  arc A58 (32.3282, 3.7851) -> (31.7992, 6.9462) centre (0, 0) ccw projected
  arc A59 (29.1217, 7.4816) -> (31.7992, 6.9462) centre (32.6179, 18.0017) ccw projected
  arc A60 (26.7684, 13.6933) -> (29.1217, 7.4816) centre (30.4377, 11.5318) ccw projected
  arc A61 (28.4189, 15.8684) -> (26.7684, 13.6933) centre (36.3576, 8.1308) ccw projected
  arc A62 (28.4189, 15.8684) -> (26.7204, 18.5865) centre (0, 0) ccw projected
  arc A63 (24.0419, 18.0565) -> (26.7204, 18.5865) centre (23.246, 29.1137) ccw projected
  arc A64 (19.4906, 22.8947) -> (24.0419, 18.0565) centre (23.7078, 22.302) ccw projected
  arc A65 (20.183, 25.5359) -> (19.4906, 22.8947) centre (30.4785, 21.4253) ccw projected
  arc A66 (20.183, 25.5359) -> (17.5737, 27.3971) centre (0, 0) ccw projected
  arc A67 (15.3019, 25.8825) -> (17.5737, 27.3971) centre (10.3352, 35.7934) ccw projected
  arc A68 (9.2455, 28.6107) -> (15.3019, 25.8825) centre (13.3685, 29.677) ccw projected
  arc A69 (8.8745, 31.3158) -> (9.2455, 28.6107) centre (19.9594, 31.4581) ccw projected
  point P0 (0, 5)
extrude "Extrusion6" cut sketch "Sketch6" against normal blind 11.43 contours A1 | A2 | A3 | A4
properties part number "counterbore side"
